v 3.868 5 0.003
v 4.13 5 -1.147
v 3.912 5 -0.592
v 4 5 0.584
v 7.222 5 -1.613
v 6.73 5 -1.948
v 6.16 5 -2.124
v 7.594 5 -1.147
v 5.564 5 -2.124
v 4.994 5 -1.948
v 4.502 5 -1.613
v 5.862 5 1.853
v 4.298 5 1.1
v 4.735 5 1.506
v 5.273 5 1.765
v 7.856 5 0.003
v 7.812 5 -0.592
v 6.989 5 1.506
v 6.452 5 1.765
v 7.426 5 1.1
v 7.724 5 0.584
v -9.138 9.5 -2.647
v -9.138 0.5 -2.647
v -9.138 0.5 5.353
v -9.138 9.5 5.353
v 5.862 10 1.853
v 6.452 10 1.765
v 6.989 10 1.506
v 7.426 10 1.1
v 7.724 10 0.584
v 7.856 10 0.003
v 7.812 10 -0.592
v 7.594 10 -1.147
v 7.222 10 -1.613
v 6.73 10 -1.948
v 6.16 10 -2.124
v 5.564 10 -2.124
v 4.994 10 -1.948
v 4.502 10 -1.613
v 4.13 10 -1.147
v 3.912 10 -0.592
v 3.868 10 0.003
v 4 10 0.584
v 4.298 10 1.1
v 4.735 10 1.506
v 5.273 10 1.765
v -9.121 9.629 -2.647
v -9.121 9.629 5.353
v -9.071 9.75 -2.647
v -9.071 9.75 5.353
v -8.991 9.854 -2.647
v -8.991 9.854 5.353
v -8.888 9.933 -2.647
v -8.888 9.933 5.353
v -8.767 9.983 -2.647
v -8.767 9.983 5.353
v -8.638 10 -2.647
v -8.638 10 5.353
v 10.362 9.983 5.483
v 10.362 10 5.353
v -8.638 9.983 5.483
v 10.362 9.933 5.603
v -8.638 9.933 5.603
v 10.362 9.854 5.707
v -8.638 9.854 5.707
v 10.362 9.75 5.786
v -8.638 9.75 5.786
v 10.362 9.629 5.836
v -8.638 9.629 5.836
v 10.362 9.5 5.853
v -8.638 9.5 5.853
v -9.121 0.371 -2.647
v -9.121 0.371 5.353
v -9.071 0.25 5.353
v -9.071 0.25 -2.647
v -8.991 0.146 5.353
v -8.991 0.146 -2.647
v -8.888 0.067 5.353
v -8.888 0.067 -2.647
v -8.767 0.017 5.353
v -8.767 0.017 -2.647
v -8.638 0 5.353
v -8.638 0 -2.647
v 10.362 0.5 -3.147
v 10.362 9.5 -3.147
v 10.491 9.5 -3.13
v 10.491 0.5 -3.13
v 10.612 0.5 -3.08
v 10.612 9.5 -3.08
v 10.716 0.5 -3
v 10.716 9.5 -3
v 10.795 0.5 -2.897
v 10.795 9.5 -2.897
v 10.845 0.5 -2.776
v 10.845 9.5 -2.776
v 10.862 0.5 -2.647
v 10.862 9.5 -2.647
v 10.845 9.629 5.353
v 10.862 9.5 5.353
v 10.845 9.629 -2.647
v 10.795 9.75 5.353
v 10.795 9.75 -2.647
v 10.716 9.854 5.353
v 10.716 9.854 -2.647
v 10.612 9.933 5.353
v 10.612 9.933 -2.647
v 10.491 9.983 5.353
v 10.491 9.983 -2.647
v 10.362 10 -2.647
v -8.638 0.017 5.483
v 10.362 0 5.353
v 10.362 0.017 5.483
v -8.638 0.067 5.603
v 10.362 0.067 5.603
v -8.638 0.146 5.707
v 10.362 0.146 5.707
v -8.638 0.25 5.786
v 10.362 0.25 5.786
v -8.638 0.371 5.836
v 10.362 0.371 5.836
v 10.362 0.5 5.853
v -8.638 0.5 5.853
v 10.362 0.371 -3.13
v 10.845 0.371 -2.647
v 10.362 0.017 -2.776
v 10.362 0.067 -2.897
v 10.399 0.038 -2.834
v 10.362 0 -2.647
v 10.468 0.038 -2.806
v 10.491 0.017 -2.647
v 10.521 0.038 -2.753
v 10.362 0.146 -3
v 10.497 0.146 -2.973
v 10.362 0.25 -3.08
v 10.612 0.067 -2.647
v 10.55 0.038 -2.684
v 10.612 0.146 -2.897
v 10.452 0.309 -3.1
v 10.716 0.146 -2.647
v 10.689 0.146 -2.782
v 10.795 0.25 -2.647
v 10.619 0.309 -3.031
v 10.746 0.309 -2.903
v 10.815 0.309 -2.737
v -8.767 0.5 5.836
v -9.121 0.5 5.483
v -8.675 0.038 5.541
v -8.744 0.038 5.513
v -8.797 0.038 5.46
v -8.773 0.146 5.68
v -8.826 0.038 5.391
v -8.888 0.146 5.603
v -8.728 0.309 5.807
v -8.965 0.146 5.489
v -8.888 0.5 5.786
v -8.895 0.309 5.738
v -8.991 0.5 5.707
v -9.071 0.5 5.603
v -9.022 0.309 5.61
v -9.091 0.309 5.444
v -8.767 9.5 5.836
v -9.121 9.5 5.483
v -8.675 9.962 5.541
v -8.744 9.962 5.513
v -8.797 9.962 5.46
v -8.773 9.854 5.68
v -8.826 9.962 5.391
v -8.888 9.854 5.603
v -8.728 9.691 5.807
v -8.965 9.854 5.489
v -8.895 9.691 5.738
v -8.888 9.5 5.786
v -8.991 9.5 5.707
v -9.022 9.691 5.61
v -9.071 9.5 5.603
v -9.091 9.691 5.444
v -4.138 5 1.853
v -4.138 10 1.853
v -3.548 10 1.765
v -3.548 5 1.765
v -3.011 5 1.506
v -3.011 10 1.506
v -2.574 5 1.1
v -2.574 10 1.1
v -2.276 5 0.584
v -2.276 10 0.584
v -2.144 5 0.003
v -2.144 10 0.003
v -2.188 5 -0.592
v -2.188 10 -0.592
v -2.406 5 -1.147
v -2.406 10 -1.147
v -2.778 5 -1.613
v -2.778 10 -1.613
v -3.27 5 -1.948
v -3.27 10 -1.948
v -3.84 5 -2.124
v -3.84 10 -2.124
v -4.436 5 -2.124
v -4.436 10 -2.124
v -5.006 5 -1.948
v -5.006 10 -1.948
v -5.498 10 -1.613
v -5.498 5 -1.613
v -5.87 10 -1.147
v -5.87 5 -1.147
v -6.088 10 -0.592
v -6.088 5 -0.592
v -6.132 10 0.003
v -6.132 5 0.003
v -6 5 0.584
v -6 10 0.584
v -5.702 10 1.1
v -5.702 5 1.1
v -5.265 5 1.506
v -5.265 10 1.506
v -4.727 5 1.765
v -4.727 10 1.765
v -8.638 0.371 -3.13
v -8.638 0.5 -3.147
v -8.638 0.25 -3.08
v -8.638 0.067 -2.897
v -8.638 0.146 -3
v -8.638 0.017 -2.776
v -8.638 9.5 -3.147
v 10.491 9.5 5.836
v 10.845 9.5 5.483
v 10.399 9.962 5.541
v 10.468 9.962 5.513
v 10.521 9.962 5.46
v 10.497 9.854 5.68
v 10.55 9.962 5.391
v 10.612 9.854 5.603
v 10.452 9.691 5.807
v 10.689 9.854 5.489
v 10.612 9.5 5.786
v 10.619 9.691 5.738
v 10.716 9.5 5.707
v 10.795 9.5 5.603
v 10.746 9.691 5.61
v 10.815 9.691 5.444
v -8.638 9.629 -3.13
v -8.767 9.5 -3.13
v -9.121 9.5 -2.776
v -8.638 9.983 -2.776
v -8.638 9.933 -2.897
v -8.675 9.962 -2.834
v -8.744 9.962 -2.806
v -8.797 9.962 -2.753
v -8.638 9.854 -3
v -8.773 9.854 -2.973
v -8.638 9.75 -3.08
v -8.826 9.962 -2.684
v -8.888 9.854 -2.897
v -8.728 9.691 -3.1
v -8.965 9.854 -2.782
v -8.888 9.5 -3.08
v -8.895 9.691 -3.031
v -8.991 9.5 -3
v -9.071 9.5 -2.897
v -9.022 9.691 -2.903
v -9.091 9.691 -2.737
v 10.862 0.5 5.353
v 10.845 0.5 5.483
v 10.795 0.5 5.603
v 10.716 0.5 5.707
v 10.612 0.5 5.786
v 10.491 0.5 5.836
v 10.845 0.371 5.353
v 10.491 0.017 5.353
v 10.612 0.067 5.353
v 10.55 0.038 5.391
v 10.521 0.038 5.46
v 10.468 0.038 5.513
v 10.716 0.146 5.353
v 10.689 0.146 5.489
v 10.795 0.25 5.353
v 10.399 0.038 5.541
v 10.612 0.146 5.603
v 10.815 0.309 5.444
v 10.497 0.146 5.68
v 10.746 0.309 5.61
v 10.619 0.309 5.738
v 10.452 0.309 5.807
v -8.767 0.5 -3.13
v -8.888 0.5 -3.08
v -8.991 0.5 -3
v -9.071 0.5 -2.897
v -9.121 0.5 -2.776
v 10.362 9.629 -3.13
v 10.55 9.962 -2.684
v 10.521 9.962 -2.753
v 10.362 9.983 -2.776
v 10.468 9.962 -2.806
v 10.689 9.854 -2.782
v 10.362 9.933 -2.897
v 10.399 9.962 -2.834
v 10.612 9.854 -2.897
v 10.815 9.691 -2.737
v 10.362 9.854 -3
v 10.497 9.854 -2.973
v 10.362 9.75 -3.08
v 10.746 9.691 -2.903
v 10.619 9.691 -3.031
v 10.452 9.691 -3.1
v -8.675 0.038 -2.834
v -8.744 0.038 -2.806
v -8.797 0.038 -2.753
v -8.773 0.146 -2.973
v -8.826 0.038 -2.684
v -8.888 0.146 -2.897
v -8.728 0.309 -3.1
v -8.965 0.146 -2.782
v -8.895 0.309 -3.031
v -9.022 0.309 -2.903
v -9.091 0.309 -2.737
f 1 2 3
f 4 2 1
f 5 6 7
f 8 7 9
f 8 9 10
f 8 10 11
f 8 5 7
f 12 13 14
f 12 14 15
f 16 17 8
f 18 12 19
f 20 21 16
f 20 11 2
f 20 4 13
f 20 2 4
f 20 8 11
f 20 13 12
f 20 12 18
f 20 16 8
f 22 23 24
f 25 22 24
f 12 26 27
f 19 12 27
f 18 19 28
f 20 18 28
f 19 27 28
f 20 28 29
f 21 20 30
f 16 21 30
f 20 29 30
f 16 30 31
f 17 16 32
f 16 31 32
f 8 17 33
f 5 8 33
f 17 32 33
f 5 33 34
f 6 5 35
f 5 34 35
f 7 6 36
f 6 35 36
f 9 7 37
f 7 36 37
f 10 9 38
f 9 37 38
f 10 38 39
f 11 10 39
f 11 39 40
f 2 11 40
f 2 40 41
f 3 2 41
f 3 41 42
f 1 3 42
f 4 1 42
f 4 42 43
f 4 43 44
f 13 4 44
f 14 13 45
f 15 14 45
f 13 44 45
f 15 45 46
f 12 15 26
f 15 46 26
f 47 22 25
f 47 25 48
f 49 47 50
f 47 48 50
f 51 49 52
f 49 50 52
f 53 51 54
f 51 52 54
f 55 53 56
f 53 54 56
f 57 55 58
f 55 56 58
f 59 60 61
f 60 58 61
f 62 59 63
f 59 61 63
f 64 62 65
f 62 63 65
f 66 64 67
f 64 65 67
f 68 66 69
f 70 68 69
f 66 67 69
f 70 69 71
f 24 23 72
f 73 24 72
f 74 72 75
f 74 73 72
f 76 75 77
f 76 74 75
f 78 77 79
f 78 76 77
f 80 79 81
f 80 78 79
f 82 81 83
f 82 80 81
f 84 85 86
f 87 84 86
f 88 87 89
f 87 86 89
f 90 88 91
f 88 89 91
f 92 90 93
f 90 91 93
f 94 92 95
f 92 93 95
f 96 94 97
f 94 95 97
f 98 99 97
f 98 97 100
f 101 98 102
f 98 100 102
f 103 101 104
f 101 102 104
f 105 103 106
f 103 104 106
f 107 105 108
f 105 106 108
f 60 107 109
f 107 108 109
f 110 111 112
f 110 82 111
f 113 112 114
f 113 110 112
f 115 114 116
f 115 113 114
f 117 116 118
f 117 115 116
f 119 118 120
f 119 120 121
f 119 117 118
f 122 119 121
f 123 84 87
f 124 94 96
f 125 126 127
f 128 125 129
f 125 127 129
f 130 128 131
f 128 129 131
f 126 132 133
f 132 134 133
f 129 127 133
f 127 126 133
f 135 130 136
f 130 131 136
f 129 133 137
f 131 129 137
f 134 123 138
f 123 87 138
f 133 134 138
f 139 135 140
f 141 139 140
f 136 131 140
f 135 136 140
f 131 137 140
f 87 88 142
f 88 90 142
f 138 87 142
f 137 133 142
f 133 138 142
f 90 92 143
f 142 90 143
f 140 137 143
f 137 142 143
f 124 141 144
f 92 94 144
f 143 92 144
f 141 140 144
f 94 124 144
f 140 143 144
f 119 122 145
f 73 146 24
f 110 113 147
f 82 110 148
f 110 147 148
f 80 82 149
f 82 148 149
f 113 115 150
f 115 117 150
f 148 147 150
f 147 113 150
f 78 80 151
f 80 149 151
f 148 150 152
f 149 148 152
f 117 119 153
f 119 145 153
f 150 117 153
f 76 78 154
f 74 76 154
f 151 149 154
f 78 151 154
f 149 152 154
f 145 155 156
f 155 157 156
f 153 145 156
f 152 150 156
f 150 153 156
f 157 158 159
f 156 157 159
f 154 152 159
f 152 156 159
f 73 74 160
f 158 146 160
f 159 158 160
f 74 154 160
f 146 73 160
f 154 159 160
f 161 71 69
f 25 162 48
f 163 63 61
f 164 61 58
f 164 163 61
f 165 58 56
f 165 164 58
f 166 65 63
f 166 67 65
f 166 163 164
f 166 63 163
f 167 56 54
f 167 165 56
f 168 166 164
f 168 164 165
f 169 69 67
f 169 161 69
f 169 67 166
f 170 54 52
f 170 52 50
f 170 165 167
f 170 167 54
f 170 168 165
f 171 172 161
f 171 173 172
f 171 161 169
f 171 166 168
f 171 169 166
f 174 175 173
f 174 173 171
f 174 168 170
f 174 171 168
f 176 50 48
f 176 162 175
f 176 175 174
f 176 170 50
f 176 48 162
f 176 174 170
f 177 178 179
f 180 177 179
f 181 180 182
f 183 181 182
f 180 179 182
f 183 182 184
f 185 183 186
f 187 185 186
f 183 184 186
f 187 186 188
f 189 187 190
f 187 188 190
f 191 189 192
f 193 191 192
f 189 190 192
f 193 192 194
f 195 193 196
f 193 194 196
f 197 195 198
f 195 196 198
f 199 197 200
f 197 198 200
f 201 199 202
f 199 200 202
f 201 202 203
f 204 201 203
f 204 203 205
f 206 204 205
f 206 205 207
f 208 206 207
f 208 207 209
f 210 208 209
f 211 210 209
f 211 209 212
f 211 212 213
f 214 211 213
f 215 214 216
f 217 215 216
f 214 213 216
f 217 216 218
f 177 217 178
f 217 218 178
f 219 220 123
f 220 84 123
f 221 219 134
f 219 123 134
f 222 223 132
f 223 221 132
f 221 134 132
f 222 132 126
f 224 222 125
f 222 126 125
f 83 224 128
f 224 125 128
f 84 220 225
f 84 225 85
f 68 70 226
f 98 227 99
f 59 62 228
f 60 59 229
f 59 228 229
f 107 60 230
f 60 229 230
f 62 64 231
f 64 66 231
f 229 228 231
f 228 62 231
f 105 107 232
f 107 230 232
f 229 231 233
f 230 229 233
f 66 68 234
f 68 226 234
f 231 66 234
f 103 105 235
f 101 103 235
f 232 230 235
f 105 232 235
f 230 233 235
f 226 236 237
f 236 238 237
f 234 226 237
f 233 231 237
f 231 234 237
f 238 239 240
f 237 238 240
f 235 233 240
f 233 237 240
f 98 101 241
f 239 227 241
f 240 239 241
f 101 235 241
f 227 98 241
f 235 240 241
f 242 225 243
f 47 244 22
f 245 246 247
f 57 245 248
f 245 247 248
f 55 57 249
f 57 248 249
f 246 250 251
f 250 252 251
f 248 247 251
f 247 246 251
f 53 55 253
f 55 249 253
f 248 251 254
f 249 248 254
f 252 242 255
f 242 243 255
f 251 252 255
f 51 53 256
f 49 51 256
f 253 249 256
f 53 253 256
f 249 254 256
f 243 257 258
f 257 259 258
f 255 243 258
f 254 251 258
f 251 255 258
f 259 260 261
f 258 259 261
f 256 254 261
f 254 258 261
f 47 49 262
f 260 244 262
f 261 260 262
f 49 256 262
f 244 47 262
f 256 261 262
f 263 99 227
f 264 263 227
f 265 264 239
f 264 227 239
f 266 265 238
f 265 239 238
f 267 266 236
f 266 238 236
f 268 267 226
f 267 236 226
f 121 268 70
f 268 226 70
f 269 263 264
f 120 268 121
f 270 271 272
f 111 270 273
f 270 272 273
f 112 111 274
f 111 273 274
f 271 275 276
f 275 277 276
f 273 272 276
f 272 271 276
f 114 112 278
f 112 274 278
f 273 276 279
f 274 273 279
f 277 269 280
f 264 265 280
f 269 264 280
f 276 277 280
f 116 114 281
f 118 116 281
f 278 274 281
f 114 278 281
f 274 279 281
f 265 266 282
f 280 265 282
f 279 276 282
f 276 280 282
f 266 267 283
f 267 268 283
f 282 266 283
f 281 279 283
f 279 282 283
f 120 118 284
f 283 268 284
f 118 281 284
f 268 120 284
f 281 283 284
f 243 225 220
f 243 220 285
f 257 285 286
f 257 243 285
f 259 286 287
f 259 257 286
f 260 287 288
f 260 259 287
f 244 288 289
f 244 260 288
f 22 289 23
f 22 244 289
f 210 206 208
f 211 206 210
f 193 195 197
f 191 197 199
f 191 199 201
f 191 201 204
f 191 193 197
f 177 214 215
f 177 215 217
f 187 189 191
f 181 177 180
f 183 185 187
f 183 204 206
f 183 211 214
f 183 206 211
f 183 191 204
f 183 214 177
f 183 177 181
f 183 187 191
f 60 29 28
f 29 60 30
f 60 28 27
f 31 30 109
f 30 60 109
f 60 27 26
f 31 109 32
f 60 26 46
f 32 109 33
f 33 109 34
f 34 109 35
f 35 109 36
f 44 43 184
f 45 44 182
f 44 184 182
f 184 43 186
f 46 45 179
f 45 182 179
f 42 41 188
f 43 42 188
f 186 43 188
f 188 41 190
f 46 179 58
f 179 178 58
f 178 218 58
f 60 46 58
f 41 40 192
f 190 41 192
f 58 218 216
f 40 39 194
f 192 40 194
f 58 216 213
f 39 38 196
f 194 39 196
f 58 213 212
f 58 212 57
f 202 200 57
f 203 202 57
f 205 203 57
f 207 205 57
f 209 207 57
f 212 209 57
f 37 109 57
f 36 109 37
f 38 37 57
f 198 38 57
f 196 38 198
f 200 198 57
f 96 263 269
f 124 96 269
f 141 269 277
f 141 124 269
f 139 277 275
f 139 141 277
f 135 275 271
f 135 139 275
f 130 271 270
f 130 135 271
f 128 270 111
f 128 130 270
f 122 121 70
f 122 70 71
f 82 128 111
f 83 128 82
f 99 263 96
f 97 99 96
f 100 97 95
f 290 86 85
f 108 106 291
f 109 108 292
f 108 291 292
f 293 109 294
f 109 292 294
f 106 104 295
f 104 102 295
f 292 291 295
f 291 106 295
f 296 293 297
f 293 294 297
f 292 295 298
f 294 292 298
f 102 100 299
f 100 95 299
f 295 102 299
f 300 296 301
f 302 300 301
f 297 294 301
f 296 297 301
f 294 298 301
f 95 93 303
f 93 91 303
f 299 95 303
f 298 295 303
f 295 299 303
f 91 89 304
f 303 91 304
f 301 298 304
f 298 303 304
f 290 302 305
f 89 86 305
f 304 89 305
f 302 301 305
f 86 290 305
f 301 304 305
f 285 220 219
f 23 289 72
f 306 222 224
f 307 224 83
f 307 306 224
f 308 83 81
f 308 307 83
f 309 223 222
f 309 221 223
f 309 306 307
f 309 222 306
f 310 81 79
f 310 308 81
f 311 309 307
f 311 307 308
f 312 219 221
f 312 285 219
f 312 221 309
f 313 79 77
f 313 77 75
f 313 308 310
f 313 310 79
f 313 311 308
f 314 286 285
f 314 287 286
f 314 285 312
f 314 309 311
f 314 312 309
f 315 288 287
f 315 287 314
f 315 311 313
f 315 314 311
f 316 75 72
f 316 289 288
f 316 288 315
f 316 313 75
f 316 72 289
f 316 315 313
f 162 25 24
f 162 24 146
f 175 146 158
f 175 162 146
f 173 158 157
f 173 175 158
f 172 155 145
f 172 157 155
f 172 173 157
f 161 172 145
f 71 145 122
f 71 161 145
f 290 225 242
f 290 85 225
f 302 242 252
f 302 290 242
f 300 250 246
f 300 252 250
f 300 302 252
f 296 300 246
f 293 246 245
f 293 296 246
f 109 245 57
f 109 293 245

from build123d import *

# Parameters (mm, degrees)
BOSS_EXTRUDE1_DEPTH = 10
SKETCH2_R           = 2
CUT_EXTRUDE1_DEPTH  = 5
FILLET2_R           = 0.5


with BuildPart() as part:
    # Sketch1 → Boss-Extrude1 (new body)
    with BuildSketch(Plane(origin=(0, 0, 0), x_dir=(1, 0, 0), z_dir=(0, 1, 0))):
        Polygon((-9.137931034, 3.146551724), (10.862068966, 3.146551724), (10.862068966, -1.853448276), (10.862068966, -5.853448276), (-9.137931034, -5.853448276), (-9.137931034, -1.853448276), align=None)
    extrude(amount=BOSS_EXTRUDE1_DEPTH)

    # Sketch2 → Cut-Extrude1 (cut)
    with BuildSketch(Plane(origin=(0, 10, 0), x_dir=(1, 0, 0), z_dir=(0, 1, 0))):
        with Locations(Location((-4.137931034, 0.146551724, 0), (0, 0, 270))):
            Circle(SKETCH2_R)
        with Locations(Location((5.862068966, 0.146551724, 0), (0, 0, 270))):
            Circle(SKETCH2_R)
    extrude(amount=-CUT_EXTRUDE1_DEPTH, mode=Mode.SUBTRACT)

    # Fillet2
    fillet2_edges = [part.edges().sort_by_distance(p)[0] for p in [
        (-9.137931034, 5, -3.146551724),
        (10.862068966, 5, -3.146551724),
        (10.862068966, 5, 5.853448276),
        (-9.137931034, 5, 5.853448276),
        (0.862068966, 10, 5.853448276),
        (10.862068966, 10, 1.353448276),
        (0.862068966, 10, -3.146551724),
        (-9.137931034, 10, 1.353448276),
        (0.862068966, 0, -3.146551724),
        (10.862068966, 0, 1.353448276),
        (0.862068966, 0, 5.853448276),
        (-9.137931034, 0, 1.353448276),
    ]]
    fillet(fillet2_edges, radius=FILLET2_R)


solid = part.part
